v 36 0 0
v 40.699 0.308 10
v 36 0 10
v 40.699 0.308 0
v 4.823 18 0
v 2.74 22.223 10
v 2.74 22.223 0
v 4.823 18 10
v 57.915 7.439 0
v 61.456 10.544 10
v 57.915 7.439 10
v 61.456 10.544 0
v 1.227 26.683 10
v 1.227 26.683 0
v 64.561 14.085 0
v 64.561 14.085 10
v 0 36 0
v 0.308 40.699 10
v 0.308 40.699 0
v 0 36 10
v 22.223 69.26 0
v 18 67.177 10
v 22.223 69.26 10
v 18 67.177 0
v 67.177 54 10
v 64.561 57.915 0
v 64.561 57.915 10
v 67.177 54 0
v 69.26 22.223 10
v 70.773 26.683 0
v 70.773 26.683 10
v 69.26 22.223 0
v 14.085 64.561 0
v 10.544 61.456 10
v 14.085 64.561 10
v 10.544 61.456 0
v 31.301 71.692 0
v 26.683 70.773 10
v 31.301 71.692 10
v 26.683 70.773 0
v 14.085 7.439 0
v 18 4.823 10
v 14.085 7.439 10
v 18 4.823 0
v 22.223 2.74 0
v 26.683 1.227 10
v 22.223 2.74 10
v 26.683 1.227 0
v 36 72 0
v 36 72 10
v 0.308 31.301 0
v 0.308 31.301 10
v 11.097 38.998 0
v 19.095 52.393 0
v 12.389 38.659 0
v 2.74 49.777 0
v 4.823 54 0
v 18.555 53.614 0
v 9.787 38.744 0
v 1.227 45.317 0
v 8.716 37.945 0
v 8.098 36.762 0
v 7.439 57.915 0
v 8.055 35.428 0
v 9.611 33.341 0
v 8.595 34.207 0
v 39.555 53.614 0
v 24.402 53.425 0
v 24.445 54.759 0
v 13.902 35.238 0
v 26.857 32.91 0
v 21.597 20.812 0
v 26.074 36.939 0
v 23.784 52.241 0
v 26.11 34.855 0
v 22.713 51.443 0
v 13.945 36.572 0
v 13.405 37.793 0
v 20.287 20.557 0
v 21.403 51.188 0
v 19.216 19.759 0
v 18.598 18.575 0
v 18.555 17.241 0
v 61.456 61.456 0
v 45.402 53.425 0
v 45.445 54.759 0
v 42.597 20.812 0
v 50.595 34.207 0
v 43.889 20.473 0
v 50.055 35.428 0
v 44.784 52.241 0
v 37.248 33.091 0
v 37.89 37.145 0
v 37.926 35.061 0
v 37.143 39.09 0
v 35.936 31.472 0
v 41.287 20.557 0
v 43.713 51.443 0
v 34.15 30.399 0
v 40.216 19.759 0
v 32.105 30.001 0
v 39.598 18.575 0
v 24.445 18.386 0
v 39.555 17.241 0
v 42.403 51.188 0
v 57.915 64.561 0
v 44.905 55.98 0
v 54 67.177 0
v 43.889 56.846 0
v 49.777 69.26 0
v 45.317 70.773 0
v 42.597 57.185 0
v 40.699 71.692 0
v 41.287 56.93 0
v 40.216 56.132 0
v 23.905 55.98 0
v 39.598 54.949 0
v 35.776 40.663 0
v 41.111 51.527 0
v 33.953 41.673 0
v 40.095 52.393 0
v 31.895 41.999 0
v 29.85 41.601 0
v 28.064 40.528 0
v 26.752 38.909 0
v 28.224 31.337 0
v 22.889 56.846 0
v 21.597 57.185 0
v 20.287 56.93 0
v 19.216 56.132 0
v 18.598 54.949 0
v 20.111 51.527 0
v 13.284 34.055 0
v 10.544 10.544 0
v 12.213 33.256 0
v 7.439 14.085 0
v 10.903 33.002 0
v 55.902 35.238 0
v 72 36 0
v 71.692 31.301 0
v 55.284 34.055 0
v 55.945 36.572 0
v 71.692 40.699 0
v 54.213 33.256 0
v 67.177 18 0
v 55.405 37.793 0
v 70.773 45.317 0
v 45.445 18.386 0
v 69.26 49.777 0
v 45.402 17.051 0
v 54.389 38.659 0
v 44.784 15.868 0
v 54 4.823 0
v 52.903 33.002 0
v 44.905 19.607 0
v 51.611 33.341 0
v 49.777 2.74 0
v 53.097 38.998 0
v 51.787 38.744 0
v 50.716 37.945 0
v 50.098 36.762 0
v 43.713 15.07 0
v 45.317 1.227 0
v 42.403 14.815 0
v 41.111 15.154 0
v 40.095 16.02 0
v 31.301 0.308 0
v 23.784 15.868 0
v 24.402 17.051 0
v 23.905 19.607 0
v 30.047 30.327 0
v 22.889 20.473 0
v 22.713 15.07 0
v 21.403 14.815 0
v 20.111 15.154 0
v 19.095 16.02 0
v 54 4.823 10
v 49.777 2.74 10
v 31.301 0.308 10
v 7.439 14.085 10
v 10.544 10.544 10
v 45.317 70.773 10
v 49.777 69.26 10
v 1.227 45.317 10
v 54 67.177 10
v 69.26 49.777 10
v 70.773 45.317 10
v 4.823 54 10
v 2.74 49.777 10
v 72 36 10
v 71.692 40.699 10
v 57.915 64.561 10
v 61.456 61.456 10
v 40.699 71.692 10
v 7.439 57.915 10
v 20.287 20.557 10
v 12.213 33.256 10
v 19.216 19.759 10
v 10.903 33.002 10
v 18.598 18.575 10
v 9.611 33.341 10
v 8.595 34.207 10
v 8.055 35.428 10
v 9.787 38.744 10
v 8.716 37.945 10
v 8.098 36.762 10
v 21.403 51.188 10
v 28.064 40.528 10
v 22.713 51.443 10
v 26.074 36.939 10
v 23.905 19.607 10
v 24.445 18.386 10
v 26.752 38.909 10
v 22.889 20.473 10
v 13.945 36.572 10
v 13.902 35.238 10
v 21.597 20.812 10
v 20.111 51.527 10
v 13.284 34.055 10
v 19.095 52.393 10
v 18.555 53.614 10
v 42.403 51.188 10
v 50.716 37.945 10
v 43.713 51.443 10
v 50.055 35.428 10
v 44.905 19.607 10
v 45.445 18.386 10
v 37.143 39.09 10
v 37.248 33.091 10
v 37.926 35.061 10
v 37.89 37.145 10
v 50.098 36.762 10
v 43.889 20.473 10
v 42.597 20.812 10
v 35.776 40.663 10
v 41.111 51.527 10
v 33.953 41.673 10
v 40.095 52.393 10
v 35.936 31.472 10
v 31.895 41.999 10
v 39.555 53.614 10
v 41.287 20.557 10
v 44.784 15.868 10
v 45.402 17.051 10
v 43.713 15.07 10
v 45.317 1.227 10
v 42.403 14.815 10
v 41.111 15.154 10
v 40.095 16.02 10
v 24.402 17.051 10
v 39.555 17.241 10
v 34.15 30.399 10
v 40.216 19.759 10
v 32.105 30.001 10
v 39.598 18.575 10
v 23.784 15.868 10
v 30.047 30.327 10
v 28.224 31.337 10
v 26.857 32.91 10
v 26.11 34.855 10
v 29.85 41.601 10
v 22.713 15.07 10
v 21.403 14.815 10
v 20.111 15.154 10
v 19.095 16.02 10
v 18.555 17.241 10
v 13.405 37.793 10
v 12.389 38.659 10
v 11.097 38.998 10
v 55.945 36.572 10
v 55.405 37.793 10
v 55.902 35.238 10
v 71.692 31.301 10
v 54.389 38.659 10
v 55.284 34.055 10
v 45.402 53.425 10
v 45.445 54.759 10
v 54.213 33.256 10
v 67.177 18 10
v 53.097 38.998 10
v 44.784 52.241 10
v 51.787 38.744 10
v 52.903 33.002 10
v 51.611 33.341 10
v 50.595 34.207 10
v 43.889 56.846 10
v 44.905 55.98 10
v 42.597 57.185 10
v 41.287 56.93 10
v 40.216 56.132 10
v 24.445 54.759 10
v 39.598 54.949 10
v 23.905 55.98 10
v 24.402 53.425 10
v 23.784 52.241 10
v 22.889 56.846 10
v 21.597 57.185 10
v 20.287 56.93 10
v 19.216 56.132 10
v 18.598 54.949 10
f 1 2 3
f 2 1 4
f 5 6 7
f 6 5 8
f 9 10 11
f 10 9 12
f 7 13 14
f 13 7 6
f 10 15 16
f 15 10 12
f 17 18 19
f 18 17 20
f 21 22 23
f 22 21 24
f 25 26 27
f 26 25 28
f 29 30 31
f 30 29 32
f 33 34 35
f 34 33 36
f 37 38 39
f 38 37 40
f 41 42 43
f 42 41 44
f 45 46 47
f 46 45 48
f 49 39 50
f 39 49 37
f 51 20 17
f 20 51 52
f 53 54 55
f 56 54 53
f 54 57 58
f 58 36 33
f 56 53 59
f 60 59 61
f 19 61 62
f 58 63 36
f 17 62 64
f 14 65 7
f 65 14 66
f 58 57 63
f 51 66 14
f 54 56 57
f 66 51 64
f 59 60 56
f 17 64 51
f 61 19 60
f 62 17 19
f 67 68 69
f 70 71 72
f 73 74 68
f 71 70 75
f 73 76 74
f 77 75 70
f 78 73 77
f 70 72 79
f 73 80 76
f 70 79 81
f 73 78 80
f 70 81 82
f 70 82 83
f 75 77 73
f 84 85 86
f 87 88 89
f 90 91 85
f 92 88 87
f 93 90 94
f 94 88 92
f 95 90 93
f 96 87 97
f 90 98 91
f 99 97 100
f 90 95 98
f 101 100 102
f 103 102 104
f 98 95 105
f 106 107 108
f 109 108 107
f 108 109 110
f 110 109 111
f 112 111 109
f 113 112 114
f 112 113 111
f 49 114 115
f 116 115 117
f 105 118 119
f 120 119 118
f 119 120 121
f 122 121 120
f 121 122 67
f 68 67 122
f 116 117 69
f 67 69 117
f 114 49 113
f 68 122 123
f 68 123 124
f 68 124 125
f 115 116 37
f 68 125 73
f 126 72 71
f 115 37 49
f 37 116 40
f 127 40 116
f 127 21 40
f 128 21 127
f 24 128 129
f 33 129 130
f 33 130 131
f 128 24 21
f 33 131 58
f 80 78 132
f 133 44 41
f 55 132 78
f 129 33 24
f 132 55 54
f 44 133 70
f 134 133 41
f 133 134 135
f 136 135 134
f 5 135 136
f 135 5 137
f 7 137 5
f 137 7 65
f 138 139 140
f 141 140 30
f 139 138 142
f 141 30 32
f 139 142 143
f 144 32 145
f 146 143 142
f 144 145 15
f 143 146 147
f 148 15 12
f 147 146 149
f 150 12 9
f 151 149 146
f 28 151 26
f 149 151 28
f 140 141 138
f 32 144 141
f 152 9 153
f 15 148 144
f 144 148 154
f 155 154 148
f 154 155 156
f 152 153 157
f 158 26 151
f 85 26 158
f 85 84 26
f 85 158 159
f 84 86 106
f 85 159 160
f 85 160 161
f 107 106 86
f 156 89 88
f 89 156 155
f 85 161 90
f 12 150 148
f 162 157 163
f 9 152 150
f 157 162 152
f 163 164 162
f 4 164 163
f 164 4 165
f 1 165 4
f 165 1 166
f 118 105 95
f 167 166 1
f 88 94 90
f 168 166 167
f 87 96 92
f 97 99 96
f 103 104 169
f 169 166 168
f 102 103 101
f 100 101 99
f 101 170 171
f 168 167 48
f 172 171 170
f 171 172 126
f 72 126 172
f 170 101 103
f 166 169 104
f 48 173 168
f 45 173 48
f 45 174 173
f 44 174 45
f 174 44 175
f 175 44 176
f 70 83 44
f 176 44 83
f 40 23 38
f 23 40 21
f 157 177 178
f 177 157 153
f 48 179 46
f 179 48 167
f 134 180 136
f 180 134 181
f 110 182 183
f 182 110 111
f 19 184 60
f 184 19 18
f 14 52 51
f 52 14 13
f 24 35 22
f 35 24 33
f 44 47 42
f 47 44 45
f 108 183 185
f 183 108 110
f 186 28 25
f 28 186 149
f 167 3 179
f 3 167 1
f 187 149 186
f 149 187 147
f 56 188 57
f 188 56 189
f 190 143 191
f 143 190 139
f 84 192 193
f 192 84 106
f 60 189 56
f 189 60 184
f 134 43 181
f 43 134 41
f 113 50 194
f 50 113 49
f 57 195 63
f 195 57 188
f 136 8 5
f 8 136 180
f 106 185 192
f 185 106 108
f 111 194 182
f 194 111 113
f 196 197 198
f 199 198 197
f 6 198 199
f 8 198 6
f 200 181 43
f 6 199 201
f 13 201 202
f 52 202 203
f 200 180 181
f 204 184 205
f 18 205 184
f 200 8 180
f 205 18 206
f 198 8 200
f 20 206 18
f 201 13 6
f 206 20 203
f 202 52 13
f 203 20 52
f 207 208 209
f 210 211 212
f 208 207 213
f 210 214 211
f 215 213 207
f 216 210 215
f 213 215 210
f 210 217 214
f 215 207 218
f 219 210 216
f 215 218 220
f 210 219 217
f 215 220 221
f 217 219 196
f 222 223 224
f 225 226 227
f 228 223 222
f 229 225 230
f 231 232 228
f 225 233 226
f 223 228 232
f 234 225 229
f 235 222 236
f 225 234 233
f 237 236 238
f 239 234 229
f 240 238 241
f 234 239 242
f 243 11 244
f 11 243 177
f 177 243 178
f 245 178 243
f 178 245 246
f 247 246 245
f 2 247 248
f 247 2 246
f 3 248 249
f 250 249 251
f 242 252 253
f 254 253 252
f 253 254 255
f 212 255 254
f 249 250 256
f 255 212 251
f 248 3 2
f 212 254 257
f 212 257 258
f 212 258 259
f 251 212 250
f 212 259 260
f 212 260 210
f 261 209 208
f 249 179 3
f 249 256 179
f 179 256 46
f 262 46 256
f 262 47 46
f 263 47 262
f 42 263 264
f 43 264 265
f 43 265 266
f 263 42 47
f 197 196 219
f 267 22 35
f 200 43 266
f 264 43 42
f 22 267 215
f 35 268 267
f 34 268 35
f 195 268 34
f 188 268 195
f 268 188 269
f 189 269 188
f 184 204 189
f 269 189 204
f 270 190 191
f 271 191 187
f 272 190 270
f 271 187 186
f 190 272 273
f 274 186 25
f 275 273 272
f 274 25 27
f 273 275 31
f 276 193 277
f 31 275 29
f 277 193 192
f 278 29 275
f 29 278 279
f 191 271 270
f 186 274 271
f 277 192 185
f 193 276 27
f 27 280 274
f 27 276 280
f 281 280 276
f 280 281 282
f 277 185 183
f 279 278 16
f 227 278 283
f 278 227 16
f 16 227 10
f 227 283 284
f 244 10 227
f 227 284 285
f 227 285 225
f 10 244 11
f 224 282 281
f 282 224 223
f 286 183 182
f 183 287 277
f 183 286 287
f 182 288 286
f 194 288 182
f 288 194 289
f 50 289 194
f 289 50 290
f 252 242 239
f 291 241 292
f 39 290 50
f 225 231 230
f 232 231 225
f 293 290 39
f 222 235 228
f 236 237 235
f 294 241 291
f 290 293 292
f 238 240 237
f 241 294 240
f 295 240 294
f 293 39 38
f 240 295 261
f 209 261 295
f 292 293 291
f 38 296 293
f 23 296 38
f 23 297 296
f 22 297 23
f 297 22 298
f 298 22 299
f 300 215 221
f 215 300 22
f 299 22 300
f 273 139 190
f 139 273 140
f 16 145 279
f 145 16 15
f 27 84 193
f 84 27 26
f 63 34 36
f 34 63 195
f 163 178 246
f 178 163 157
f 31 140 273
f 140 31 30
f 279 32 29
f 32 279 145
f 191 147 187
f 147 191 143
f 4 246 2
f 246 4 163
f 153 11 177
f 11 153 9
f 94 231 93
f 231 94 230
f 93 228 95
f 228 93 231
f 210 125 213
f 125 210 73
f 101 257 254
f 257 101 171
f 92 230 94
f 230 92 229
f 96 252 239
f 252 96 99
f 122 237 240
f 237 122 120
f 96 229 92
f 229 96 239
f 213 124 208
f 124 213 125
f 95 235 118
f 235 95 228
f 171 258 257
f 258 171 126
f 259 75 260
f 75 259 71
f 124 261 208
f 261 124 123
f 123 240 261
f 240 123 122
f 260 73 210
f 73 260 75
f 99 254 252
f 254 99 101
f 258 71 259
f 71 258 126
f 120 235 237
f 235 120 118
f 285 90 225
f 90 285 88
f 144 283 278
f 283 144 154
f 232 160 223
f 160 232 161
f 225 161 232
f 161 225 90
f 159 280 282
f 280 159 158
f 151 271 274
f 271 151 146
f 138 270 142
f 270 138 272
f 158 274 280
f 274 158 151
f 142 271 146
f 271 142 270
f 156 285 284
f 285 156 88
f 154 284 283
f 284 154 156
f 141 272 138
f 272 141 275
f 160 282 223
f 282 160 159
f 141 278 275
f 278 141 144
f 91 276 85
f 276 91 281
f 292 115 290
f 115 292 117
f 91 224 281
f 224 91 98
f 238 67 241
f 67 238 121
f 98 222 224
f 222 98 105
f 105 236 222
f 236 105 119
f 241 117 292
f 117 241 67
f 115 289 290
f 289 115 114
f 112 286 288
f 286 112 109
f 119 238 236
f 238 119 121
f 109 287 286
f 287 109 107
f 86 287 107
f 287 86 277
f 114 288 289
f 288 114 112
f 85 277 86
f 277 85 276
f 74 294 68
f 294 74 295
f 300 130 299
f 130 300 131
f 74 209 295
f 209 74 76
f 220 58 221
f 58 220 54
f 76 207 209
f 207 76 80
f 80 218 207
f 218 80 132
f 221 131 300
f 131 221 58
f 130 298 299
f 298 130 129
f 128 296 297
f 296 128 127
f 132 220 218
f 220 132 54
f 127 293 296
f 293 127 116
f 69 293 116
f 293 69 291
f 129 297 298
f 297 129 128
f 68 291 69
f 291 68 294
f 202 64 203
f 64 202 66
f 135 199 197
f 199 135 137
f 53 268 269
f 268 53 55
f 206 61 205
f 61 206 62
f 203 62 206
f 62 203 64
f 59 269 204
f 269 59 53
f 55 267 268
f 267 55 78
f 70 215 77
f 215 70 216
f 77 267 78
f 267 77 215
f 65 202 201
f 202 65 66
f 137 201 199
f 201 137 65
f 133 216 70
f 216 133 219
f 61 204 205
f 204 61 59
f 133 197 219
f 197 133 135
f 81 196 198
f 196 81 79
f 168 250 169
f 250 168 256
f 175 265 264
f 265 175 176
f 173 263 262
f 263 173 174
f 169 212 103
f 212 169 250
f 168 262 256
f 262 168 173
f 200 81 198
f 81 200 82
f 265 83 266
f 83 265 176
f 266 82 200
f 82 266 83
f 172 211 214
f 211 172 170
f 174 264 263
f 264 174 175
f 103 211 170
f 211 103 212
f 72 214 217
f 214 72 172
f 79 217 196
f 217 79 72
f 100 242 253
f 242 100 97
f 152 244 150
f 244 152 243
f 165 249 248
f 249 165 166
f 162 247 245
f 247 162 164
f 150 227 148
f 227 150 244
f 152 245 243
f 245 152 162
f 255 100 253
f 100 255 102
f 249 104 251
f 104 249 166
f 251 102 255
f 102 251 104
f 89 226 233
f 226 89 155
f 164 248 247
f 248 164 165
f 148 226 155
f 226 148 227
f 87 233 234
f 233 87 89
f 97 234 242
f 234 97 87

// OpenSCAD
$fn = 32;

// ----------------------------------------------------------------------
// Cam plate: eccentric cam, base R36
// ----------------------------------------------------------------------

// --- parameters (mm) ---
base_r = 36;              // base circle radius
lobe_h = 12;              // cam lobe rise
bore_r = 6;               // shaft bore radius
plate_t = 10;             // plate thickness, Z (extrusion height)
ecc = 4;                  // disc eccentricity
ring_r = 21;              // lightening ring radius
bolt_r = 3;               // lightening hole radius

profile = [[72, 36], [71.692, 40.699], [70.773, 45.317], [69.26, 49.777], [67.177, 54], [64.561, 57.915], [61.456, 61.456], [57.915, 64.561], [54, 67.177], [49.777, 69.26], [45.317, 70.773], [40.699, 71.692], [36, 72], [31.301, 71.692], [26.683, 70.773], [22.223, 69.26], [18, 67.177], [14.085, 64.561], [10.544, 61.456], [7.439, 57.915], [4.823, 54], [2.74, 49.777], [1.227, 45.317], [0.308, 40.699], [0, 36], [0.308, 31.301], [1.227, 26.683], [2.74, 22.223], [4.823, 18], [7.439, 14.085], [10.544, 10.544], [14.085, 7.439], [18, 4.823], [22.223, 2.74], [26.683, 1.227], [31.301, 0.308], [36, 0], [40.699, 0.308], [45.317, 1.227], [49.777, 2.74], [54, 4.823], [57.915, 7.439], [61.456, 10.544], [64.561, 14.085], [67.177, 18], [69.26, 22.223], [70.773, 26.683], [71.692, 31.301]];  // primary outline, 48 points, counter clockwise
void_1 = [[37.89, 37.145], [37.143, 39.09], [35.776, 40.663], [33.953, 41.673], [31.895, 41.999], [29.85, 41.601], [28.064, 40.528], [26.752, 38.909], [26.074, 36.939], [26.11, 34.855], [26.857, 32.91], [28.224, 31.337], [30.047, 30.327], [32.105, 30.001], [34.15, 30.399], [35.936, 31.472], [37.248, 33.091], [37.926, 35.061]];  // shaft bore, 18 points
void_2 = [[55.945, 36.572], [55.405, 37.793], [54.389, 38.659], [53.097, 38.998], [51.787, 38.744], [50.716, 37.945], [50.098, 36.762], [50.055, 35.428], [50.595, 34.207], [51.611, 33.341], [52.903, 33.002], [54.213, 33.256], [55.284, 34.055], [55.902, 35.238]];  // lightening hole 1, 14 points
void_3 = [[45.445, 54.759], [44.905, 55.98], [43.889, 56.846], [42.597, 57.185], [41.287, 56.93], [40.216, 56.132], [39.598, 54.949], [39.555, 53.614], [40.095, 52.393], [41.111, 51.527], [42.403, 51.188], [43.713, 51.443], [44.784, 52.241], [45.402, 53.425]];  // lightening hole 2, 14 points
void_4 = [[24.445, 54.759], [23.905, 55.98], [22.889, 56.846], [21.597, 57.185], [20.287, 56.93], [19.216, 56.132], [18.598, 54.949], [18.555, 53.614], [19.095, 52.393], [20.111, 51.527], [21.403, 51.188], [22.713, 51.443], [23.784, 52.241], [24.402, 53.425]];  // lightening hole 3, 14 points
void_5 = [[13.945, 36.572], [13.405, 37.793], [12.389, 38.659], [11.097, 38.998], [9.787, 38.744], [8.716, 37.945], [8.098, 36.762], [8.055, 35.428], [8.595, 34.207], [9.611, 33.341], [10.903, 33.002], [12.213, 33.256], [13.284, 34.055], [13.902, 35.238]];  // lightening hole 4, 14 points
void_6 = [[24.445, 18.386], [23.905, 19.607], [22.889, 20.473], [21.597, 20.812], [20.287, 20.557], [19.216, 19.759], [18.598, 18.575], [18.555, 17.241], [19.095, 16.02], [20.111, 15.154], [21.403, 14.815], [22.713, 15.07], [23.784, 15.868], [24.402, 17.051]];  // lightening hole 5, 14 points
void_7 = [[45.445, 18.386], [44.905, 19.607], [43.889, 20.473], [42.597, 20.812], [41.287, 20.557], [40.216, 19.759], [39.598, 18.575], [39.555, 17.241], [40.095, 16.02], [41.111, 15.154], [42.403, 14.815], [43.713, 15.07], [44.784, 15.868], [45.402, 17.051]];  // lightening hole 6, 14 points

// --- the one profile operation ---
difference() {
  linear_extrude(height = plate_t) polygon(points = profile);
  translate([0, 0, -1])
    linear_extrude(height = plate_t + 2) polygon(points = void_1);
  translate([0, 0, -1])
    linear_extrude(height = plate_t + 2) polygon(points = void_2);
  translate([0, 0, -1])
    linear_extrude(height = plate_t + 2) polygon(points = void_3);
  translate([0, 0, -1])
    linear_extrude(height = plate_t + 2) polygon(points = void_4);
  translate([0, 0, -1])
    linear_extrude(height = plate_t + 2) polygon(points = void_5);
  translate([0, 0, -1])
    linear_extrude(height = plate_t + 2) polygon(points = void_6);
  translate([0, 0, -1])
    linear_extrude(height = plate_t + 2) polygon(points = void_7);
}
